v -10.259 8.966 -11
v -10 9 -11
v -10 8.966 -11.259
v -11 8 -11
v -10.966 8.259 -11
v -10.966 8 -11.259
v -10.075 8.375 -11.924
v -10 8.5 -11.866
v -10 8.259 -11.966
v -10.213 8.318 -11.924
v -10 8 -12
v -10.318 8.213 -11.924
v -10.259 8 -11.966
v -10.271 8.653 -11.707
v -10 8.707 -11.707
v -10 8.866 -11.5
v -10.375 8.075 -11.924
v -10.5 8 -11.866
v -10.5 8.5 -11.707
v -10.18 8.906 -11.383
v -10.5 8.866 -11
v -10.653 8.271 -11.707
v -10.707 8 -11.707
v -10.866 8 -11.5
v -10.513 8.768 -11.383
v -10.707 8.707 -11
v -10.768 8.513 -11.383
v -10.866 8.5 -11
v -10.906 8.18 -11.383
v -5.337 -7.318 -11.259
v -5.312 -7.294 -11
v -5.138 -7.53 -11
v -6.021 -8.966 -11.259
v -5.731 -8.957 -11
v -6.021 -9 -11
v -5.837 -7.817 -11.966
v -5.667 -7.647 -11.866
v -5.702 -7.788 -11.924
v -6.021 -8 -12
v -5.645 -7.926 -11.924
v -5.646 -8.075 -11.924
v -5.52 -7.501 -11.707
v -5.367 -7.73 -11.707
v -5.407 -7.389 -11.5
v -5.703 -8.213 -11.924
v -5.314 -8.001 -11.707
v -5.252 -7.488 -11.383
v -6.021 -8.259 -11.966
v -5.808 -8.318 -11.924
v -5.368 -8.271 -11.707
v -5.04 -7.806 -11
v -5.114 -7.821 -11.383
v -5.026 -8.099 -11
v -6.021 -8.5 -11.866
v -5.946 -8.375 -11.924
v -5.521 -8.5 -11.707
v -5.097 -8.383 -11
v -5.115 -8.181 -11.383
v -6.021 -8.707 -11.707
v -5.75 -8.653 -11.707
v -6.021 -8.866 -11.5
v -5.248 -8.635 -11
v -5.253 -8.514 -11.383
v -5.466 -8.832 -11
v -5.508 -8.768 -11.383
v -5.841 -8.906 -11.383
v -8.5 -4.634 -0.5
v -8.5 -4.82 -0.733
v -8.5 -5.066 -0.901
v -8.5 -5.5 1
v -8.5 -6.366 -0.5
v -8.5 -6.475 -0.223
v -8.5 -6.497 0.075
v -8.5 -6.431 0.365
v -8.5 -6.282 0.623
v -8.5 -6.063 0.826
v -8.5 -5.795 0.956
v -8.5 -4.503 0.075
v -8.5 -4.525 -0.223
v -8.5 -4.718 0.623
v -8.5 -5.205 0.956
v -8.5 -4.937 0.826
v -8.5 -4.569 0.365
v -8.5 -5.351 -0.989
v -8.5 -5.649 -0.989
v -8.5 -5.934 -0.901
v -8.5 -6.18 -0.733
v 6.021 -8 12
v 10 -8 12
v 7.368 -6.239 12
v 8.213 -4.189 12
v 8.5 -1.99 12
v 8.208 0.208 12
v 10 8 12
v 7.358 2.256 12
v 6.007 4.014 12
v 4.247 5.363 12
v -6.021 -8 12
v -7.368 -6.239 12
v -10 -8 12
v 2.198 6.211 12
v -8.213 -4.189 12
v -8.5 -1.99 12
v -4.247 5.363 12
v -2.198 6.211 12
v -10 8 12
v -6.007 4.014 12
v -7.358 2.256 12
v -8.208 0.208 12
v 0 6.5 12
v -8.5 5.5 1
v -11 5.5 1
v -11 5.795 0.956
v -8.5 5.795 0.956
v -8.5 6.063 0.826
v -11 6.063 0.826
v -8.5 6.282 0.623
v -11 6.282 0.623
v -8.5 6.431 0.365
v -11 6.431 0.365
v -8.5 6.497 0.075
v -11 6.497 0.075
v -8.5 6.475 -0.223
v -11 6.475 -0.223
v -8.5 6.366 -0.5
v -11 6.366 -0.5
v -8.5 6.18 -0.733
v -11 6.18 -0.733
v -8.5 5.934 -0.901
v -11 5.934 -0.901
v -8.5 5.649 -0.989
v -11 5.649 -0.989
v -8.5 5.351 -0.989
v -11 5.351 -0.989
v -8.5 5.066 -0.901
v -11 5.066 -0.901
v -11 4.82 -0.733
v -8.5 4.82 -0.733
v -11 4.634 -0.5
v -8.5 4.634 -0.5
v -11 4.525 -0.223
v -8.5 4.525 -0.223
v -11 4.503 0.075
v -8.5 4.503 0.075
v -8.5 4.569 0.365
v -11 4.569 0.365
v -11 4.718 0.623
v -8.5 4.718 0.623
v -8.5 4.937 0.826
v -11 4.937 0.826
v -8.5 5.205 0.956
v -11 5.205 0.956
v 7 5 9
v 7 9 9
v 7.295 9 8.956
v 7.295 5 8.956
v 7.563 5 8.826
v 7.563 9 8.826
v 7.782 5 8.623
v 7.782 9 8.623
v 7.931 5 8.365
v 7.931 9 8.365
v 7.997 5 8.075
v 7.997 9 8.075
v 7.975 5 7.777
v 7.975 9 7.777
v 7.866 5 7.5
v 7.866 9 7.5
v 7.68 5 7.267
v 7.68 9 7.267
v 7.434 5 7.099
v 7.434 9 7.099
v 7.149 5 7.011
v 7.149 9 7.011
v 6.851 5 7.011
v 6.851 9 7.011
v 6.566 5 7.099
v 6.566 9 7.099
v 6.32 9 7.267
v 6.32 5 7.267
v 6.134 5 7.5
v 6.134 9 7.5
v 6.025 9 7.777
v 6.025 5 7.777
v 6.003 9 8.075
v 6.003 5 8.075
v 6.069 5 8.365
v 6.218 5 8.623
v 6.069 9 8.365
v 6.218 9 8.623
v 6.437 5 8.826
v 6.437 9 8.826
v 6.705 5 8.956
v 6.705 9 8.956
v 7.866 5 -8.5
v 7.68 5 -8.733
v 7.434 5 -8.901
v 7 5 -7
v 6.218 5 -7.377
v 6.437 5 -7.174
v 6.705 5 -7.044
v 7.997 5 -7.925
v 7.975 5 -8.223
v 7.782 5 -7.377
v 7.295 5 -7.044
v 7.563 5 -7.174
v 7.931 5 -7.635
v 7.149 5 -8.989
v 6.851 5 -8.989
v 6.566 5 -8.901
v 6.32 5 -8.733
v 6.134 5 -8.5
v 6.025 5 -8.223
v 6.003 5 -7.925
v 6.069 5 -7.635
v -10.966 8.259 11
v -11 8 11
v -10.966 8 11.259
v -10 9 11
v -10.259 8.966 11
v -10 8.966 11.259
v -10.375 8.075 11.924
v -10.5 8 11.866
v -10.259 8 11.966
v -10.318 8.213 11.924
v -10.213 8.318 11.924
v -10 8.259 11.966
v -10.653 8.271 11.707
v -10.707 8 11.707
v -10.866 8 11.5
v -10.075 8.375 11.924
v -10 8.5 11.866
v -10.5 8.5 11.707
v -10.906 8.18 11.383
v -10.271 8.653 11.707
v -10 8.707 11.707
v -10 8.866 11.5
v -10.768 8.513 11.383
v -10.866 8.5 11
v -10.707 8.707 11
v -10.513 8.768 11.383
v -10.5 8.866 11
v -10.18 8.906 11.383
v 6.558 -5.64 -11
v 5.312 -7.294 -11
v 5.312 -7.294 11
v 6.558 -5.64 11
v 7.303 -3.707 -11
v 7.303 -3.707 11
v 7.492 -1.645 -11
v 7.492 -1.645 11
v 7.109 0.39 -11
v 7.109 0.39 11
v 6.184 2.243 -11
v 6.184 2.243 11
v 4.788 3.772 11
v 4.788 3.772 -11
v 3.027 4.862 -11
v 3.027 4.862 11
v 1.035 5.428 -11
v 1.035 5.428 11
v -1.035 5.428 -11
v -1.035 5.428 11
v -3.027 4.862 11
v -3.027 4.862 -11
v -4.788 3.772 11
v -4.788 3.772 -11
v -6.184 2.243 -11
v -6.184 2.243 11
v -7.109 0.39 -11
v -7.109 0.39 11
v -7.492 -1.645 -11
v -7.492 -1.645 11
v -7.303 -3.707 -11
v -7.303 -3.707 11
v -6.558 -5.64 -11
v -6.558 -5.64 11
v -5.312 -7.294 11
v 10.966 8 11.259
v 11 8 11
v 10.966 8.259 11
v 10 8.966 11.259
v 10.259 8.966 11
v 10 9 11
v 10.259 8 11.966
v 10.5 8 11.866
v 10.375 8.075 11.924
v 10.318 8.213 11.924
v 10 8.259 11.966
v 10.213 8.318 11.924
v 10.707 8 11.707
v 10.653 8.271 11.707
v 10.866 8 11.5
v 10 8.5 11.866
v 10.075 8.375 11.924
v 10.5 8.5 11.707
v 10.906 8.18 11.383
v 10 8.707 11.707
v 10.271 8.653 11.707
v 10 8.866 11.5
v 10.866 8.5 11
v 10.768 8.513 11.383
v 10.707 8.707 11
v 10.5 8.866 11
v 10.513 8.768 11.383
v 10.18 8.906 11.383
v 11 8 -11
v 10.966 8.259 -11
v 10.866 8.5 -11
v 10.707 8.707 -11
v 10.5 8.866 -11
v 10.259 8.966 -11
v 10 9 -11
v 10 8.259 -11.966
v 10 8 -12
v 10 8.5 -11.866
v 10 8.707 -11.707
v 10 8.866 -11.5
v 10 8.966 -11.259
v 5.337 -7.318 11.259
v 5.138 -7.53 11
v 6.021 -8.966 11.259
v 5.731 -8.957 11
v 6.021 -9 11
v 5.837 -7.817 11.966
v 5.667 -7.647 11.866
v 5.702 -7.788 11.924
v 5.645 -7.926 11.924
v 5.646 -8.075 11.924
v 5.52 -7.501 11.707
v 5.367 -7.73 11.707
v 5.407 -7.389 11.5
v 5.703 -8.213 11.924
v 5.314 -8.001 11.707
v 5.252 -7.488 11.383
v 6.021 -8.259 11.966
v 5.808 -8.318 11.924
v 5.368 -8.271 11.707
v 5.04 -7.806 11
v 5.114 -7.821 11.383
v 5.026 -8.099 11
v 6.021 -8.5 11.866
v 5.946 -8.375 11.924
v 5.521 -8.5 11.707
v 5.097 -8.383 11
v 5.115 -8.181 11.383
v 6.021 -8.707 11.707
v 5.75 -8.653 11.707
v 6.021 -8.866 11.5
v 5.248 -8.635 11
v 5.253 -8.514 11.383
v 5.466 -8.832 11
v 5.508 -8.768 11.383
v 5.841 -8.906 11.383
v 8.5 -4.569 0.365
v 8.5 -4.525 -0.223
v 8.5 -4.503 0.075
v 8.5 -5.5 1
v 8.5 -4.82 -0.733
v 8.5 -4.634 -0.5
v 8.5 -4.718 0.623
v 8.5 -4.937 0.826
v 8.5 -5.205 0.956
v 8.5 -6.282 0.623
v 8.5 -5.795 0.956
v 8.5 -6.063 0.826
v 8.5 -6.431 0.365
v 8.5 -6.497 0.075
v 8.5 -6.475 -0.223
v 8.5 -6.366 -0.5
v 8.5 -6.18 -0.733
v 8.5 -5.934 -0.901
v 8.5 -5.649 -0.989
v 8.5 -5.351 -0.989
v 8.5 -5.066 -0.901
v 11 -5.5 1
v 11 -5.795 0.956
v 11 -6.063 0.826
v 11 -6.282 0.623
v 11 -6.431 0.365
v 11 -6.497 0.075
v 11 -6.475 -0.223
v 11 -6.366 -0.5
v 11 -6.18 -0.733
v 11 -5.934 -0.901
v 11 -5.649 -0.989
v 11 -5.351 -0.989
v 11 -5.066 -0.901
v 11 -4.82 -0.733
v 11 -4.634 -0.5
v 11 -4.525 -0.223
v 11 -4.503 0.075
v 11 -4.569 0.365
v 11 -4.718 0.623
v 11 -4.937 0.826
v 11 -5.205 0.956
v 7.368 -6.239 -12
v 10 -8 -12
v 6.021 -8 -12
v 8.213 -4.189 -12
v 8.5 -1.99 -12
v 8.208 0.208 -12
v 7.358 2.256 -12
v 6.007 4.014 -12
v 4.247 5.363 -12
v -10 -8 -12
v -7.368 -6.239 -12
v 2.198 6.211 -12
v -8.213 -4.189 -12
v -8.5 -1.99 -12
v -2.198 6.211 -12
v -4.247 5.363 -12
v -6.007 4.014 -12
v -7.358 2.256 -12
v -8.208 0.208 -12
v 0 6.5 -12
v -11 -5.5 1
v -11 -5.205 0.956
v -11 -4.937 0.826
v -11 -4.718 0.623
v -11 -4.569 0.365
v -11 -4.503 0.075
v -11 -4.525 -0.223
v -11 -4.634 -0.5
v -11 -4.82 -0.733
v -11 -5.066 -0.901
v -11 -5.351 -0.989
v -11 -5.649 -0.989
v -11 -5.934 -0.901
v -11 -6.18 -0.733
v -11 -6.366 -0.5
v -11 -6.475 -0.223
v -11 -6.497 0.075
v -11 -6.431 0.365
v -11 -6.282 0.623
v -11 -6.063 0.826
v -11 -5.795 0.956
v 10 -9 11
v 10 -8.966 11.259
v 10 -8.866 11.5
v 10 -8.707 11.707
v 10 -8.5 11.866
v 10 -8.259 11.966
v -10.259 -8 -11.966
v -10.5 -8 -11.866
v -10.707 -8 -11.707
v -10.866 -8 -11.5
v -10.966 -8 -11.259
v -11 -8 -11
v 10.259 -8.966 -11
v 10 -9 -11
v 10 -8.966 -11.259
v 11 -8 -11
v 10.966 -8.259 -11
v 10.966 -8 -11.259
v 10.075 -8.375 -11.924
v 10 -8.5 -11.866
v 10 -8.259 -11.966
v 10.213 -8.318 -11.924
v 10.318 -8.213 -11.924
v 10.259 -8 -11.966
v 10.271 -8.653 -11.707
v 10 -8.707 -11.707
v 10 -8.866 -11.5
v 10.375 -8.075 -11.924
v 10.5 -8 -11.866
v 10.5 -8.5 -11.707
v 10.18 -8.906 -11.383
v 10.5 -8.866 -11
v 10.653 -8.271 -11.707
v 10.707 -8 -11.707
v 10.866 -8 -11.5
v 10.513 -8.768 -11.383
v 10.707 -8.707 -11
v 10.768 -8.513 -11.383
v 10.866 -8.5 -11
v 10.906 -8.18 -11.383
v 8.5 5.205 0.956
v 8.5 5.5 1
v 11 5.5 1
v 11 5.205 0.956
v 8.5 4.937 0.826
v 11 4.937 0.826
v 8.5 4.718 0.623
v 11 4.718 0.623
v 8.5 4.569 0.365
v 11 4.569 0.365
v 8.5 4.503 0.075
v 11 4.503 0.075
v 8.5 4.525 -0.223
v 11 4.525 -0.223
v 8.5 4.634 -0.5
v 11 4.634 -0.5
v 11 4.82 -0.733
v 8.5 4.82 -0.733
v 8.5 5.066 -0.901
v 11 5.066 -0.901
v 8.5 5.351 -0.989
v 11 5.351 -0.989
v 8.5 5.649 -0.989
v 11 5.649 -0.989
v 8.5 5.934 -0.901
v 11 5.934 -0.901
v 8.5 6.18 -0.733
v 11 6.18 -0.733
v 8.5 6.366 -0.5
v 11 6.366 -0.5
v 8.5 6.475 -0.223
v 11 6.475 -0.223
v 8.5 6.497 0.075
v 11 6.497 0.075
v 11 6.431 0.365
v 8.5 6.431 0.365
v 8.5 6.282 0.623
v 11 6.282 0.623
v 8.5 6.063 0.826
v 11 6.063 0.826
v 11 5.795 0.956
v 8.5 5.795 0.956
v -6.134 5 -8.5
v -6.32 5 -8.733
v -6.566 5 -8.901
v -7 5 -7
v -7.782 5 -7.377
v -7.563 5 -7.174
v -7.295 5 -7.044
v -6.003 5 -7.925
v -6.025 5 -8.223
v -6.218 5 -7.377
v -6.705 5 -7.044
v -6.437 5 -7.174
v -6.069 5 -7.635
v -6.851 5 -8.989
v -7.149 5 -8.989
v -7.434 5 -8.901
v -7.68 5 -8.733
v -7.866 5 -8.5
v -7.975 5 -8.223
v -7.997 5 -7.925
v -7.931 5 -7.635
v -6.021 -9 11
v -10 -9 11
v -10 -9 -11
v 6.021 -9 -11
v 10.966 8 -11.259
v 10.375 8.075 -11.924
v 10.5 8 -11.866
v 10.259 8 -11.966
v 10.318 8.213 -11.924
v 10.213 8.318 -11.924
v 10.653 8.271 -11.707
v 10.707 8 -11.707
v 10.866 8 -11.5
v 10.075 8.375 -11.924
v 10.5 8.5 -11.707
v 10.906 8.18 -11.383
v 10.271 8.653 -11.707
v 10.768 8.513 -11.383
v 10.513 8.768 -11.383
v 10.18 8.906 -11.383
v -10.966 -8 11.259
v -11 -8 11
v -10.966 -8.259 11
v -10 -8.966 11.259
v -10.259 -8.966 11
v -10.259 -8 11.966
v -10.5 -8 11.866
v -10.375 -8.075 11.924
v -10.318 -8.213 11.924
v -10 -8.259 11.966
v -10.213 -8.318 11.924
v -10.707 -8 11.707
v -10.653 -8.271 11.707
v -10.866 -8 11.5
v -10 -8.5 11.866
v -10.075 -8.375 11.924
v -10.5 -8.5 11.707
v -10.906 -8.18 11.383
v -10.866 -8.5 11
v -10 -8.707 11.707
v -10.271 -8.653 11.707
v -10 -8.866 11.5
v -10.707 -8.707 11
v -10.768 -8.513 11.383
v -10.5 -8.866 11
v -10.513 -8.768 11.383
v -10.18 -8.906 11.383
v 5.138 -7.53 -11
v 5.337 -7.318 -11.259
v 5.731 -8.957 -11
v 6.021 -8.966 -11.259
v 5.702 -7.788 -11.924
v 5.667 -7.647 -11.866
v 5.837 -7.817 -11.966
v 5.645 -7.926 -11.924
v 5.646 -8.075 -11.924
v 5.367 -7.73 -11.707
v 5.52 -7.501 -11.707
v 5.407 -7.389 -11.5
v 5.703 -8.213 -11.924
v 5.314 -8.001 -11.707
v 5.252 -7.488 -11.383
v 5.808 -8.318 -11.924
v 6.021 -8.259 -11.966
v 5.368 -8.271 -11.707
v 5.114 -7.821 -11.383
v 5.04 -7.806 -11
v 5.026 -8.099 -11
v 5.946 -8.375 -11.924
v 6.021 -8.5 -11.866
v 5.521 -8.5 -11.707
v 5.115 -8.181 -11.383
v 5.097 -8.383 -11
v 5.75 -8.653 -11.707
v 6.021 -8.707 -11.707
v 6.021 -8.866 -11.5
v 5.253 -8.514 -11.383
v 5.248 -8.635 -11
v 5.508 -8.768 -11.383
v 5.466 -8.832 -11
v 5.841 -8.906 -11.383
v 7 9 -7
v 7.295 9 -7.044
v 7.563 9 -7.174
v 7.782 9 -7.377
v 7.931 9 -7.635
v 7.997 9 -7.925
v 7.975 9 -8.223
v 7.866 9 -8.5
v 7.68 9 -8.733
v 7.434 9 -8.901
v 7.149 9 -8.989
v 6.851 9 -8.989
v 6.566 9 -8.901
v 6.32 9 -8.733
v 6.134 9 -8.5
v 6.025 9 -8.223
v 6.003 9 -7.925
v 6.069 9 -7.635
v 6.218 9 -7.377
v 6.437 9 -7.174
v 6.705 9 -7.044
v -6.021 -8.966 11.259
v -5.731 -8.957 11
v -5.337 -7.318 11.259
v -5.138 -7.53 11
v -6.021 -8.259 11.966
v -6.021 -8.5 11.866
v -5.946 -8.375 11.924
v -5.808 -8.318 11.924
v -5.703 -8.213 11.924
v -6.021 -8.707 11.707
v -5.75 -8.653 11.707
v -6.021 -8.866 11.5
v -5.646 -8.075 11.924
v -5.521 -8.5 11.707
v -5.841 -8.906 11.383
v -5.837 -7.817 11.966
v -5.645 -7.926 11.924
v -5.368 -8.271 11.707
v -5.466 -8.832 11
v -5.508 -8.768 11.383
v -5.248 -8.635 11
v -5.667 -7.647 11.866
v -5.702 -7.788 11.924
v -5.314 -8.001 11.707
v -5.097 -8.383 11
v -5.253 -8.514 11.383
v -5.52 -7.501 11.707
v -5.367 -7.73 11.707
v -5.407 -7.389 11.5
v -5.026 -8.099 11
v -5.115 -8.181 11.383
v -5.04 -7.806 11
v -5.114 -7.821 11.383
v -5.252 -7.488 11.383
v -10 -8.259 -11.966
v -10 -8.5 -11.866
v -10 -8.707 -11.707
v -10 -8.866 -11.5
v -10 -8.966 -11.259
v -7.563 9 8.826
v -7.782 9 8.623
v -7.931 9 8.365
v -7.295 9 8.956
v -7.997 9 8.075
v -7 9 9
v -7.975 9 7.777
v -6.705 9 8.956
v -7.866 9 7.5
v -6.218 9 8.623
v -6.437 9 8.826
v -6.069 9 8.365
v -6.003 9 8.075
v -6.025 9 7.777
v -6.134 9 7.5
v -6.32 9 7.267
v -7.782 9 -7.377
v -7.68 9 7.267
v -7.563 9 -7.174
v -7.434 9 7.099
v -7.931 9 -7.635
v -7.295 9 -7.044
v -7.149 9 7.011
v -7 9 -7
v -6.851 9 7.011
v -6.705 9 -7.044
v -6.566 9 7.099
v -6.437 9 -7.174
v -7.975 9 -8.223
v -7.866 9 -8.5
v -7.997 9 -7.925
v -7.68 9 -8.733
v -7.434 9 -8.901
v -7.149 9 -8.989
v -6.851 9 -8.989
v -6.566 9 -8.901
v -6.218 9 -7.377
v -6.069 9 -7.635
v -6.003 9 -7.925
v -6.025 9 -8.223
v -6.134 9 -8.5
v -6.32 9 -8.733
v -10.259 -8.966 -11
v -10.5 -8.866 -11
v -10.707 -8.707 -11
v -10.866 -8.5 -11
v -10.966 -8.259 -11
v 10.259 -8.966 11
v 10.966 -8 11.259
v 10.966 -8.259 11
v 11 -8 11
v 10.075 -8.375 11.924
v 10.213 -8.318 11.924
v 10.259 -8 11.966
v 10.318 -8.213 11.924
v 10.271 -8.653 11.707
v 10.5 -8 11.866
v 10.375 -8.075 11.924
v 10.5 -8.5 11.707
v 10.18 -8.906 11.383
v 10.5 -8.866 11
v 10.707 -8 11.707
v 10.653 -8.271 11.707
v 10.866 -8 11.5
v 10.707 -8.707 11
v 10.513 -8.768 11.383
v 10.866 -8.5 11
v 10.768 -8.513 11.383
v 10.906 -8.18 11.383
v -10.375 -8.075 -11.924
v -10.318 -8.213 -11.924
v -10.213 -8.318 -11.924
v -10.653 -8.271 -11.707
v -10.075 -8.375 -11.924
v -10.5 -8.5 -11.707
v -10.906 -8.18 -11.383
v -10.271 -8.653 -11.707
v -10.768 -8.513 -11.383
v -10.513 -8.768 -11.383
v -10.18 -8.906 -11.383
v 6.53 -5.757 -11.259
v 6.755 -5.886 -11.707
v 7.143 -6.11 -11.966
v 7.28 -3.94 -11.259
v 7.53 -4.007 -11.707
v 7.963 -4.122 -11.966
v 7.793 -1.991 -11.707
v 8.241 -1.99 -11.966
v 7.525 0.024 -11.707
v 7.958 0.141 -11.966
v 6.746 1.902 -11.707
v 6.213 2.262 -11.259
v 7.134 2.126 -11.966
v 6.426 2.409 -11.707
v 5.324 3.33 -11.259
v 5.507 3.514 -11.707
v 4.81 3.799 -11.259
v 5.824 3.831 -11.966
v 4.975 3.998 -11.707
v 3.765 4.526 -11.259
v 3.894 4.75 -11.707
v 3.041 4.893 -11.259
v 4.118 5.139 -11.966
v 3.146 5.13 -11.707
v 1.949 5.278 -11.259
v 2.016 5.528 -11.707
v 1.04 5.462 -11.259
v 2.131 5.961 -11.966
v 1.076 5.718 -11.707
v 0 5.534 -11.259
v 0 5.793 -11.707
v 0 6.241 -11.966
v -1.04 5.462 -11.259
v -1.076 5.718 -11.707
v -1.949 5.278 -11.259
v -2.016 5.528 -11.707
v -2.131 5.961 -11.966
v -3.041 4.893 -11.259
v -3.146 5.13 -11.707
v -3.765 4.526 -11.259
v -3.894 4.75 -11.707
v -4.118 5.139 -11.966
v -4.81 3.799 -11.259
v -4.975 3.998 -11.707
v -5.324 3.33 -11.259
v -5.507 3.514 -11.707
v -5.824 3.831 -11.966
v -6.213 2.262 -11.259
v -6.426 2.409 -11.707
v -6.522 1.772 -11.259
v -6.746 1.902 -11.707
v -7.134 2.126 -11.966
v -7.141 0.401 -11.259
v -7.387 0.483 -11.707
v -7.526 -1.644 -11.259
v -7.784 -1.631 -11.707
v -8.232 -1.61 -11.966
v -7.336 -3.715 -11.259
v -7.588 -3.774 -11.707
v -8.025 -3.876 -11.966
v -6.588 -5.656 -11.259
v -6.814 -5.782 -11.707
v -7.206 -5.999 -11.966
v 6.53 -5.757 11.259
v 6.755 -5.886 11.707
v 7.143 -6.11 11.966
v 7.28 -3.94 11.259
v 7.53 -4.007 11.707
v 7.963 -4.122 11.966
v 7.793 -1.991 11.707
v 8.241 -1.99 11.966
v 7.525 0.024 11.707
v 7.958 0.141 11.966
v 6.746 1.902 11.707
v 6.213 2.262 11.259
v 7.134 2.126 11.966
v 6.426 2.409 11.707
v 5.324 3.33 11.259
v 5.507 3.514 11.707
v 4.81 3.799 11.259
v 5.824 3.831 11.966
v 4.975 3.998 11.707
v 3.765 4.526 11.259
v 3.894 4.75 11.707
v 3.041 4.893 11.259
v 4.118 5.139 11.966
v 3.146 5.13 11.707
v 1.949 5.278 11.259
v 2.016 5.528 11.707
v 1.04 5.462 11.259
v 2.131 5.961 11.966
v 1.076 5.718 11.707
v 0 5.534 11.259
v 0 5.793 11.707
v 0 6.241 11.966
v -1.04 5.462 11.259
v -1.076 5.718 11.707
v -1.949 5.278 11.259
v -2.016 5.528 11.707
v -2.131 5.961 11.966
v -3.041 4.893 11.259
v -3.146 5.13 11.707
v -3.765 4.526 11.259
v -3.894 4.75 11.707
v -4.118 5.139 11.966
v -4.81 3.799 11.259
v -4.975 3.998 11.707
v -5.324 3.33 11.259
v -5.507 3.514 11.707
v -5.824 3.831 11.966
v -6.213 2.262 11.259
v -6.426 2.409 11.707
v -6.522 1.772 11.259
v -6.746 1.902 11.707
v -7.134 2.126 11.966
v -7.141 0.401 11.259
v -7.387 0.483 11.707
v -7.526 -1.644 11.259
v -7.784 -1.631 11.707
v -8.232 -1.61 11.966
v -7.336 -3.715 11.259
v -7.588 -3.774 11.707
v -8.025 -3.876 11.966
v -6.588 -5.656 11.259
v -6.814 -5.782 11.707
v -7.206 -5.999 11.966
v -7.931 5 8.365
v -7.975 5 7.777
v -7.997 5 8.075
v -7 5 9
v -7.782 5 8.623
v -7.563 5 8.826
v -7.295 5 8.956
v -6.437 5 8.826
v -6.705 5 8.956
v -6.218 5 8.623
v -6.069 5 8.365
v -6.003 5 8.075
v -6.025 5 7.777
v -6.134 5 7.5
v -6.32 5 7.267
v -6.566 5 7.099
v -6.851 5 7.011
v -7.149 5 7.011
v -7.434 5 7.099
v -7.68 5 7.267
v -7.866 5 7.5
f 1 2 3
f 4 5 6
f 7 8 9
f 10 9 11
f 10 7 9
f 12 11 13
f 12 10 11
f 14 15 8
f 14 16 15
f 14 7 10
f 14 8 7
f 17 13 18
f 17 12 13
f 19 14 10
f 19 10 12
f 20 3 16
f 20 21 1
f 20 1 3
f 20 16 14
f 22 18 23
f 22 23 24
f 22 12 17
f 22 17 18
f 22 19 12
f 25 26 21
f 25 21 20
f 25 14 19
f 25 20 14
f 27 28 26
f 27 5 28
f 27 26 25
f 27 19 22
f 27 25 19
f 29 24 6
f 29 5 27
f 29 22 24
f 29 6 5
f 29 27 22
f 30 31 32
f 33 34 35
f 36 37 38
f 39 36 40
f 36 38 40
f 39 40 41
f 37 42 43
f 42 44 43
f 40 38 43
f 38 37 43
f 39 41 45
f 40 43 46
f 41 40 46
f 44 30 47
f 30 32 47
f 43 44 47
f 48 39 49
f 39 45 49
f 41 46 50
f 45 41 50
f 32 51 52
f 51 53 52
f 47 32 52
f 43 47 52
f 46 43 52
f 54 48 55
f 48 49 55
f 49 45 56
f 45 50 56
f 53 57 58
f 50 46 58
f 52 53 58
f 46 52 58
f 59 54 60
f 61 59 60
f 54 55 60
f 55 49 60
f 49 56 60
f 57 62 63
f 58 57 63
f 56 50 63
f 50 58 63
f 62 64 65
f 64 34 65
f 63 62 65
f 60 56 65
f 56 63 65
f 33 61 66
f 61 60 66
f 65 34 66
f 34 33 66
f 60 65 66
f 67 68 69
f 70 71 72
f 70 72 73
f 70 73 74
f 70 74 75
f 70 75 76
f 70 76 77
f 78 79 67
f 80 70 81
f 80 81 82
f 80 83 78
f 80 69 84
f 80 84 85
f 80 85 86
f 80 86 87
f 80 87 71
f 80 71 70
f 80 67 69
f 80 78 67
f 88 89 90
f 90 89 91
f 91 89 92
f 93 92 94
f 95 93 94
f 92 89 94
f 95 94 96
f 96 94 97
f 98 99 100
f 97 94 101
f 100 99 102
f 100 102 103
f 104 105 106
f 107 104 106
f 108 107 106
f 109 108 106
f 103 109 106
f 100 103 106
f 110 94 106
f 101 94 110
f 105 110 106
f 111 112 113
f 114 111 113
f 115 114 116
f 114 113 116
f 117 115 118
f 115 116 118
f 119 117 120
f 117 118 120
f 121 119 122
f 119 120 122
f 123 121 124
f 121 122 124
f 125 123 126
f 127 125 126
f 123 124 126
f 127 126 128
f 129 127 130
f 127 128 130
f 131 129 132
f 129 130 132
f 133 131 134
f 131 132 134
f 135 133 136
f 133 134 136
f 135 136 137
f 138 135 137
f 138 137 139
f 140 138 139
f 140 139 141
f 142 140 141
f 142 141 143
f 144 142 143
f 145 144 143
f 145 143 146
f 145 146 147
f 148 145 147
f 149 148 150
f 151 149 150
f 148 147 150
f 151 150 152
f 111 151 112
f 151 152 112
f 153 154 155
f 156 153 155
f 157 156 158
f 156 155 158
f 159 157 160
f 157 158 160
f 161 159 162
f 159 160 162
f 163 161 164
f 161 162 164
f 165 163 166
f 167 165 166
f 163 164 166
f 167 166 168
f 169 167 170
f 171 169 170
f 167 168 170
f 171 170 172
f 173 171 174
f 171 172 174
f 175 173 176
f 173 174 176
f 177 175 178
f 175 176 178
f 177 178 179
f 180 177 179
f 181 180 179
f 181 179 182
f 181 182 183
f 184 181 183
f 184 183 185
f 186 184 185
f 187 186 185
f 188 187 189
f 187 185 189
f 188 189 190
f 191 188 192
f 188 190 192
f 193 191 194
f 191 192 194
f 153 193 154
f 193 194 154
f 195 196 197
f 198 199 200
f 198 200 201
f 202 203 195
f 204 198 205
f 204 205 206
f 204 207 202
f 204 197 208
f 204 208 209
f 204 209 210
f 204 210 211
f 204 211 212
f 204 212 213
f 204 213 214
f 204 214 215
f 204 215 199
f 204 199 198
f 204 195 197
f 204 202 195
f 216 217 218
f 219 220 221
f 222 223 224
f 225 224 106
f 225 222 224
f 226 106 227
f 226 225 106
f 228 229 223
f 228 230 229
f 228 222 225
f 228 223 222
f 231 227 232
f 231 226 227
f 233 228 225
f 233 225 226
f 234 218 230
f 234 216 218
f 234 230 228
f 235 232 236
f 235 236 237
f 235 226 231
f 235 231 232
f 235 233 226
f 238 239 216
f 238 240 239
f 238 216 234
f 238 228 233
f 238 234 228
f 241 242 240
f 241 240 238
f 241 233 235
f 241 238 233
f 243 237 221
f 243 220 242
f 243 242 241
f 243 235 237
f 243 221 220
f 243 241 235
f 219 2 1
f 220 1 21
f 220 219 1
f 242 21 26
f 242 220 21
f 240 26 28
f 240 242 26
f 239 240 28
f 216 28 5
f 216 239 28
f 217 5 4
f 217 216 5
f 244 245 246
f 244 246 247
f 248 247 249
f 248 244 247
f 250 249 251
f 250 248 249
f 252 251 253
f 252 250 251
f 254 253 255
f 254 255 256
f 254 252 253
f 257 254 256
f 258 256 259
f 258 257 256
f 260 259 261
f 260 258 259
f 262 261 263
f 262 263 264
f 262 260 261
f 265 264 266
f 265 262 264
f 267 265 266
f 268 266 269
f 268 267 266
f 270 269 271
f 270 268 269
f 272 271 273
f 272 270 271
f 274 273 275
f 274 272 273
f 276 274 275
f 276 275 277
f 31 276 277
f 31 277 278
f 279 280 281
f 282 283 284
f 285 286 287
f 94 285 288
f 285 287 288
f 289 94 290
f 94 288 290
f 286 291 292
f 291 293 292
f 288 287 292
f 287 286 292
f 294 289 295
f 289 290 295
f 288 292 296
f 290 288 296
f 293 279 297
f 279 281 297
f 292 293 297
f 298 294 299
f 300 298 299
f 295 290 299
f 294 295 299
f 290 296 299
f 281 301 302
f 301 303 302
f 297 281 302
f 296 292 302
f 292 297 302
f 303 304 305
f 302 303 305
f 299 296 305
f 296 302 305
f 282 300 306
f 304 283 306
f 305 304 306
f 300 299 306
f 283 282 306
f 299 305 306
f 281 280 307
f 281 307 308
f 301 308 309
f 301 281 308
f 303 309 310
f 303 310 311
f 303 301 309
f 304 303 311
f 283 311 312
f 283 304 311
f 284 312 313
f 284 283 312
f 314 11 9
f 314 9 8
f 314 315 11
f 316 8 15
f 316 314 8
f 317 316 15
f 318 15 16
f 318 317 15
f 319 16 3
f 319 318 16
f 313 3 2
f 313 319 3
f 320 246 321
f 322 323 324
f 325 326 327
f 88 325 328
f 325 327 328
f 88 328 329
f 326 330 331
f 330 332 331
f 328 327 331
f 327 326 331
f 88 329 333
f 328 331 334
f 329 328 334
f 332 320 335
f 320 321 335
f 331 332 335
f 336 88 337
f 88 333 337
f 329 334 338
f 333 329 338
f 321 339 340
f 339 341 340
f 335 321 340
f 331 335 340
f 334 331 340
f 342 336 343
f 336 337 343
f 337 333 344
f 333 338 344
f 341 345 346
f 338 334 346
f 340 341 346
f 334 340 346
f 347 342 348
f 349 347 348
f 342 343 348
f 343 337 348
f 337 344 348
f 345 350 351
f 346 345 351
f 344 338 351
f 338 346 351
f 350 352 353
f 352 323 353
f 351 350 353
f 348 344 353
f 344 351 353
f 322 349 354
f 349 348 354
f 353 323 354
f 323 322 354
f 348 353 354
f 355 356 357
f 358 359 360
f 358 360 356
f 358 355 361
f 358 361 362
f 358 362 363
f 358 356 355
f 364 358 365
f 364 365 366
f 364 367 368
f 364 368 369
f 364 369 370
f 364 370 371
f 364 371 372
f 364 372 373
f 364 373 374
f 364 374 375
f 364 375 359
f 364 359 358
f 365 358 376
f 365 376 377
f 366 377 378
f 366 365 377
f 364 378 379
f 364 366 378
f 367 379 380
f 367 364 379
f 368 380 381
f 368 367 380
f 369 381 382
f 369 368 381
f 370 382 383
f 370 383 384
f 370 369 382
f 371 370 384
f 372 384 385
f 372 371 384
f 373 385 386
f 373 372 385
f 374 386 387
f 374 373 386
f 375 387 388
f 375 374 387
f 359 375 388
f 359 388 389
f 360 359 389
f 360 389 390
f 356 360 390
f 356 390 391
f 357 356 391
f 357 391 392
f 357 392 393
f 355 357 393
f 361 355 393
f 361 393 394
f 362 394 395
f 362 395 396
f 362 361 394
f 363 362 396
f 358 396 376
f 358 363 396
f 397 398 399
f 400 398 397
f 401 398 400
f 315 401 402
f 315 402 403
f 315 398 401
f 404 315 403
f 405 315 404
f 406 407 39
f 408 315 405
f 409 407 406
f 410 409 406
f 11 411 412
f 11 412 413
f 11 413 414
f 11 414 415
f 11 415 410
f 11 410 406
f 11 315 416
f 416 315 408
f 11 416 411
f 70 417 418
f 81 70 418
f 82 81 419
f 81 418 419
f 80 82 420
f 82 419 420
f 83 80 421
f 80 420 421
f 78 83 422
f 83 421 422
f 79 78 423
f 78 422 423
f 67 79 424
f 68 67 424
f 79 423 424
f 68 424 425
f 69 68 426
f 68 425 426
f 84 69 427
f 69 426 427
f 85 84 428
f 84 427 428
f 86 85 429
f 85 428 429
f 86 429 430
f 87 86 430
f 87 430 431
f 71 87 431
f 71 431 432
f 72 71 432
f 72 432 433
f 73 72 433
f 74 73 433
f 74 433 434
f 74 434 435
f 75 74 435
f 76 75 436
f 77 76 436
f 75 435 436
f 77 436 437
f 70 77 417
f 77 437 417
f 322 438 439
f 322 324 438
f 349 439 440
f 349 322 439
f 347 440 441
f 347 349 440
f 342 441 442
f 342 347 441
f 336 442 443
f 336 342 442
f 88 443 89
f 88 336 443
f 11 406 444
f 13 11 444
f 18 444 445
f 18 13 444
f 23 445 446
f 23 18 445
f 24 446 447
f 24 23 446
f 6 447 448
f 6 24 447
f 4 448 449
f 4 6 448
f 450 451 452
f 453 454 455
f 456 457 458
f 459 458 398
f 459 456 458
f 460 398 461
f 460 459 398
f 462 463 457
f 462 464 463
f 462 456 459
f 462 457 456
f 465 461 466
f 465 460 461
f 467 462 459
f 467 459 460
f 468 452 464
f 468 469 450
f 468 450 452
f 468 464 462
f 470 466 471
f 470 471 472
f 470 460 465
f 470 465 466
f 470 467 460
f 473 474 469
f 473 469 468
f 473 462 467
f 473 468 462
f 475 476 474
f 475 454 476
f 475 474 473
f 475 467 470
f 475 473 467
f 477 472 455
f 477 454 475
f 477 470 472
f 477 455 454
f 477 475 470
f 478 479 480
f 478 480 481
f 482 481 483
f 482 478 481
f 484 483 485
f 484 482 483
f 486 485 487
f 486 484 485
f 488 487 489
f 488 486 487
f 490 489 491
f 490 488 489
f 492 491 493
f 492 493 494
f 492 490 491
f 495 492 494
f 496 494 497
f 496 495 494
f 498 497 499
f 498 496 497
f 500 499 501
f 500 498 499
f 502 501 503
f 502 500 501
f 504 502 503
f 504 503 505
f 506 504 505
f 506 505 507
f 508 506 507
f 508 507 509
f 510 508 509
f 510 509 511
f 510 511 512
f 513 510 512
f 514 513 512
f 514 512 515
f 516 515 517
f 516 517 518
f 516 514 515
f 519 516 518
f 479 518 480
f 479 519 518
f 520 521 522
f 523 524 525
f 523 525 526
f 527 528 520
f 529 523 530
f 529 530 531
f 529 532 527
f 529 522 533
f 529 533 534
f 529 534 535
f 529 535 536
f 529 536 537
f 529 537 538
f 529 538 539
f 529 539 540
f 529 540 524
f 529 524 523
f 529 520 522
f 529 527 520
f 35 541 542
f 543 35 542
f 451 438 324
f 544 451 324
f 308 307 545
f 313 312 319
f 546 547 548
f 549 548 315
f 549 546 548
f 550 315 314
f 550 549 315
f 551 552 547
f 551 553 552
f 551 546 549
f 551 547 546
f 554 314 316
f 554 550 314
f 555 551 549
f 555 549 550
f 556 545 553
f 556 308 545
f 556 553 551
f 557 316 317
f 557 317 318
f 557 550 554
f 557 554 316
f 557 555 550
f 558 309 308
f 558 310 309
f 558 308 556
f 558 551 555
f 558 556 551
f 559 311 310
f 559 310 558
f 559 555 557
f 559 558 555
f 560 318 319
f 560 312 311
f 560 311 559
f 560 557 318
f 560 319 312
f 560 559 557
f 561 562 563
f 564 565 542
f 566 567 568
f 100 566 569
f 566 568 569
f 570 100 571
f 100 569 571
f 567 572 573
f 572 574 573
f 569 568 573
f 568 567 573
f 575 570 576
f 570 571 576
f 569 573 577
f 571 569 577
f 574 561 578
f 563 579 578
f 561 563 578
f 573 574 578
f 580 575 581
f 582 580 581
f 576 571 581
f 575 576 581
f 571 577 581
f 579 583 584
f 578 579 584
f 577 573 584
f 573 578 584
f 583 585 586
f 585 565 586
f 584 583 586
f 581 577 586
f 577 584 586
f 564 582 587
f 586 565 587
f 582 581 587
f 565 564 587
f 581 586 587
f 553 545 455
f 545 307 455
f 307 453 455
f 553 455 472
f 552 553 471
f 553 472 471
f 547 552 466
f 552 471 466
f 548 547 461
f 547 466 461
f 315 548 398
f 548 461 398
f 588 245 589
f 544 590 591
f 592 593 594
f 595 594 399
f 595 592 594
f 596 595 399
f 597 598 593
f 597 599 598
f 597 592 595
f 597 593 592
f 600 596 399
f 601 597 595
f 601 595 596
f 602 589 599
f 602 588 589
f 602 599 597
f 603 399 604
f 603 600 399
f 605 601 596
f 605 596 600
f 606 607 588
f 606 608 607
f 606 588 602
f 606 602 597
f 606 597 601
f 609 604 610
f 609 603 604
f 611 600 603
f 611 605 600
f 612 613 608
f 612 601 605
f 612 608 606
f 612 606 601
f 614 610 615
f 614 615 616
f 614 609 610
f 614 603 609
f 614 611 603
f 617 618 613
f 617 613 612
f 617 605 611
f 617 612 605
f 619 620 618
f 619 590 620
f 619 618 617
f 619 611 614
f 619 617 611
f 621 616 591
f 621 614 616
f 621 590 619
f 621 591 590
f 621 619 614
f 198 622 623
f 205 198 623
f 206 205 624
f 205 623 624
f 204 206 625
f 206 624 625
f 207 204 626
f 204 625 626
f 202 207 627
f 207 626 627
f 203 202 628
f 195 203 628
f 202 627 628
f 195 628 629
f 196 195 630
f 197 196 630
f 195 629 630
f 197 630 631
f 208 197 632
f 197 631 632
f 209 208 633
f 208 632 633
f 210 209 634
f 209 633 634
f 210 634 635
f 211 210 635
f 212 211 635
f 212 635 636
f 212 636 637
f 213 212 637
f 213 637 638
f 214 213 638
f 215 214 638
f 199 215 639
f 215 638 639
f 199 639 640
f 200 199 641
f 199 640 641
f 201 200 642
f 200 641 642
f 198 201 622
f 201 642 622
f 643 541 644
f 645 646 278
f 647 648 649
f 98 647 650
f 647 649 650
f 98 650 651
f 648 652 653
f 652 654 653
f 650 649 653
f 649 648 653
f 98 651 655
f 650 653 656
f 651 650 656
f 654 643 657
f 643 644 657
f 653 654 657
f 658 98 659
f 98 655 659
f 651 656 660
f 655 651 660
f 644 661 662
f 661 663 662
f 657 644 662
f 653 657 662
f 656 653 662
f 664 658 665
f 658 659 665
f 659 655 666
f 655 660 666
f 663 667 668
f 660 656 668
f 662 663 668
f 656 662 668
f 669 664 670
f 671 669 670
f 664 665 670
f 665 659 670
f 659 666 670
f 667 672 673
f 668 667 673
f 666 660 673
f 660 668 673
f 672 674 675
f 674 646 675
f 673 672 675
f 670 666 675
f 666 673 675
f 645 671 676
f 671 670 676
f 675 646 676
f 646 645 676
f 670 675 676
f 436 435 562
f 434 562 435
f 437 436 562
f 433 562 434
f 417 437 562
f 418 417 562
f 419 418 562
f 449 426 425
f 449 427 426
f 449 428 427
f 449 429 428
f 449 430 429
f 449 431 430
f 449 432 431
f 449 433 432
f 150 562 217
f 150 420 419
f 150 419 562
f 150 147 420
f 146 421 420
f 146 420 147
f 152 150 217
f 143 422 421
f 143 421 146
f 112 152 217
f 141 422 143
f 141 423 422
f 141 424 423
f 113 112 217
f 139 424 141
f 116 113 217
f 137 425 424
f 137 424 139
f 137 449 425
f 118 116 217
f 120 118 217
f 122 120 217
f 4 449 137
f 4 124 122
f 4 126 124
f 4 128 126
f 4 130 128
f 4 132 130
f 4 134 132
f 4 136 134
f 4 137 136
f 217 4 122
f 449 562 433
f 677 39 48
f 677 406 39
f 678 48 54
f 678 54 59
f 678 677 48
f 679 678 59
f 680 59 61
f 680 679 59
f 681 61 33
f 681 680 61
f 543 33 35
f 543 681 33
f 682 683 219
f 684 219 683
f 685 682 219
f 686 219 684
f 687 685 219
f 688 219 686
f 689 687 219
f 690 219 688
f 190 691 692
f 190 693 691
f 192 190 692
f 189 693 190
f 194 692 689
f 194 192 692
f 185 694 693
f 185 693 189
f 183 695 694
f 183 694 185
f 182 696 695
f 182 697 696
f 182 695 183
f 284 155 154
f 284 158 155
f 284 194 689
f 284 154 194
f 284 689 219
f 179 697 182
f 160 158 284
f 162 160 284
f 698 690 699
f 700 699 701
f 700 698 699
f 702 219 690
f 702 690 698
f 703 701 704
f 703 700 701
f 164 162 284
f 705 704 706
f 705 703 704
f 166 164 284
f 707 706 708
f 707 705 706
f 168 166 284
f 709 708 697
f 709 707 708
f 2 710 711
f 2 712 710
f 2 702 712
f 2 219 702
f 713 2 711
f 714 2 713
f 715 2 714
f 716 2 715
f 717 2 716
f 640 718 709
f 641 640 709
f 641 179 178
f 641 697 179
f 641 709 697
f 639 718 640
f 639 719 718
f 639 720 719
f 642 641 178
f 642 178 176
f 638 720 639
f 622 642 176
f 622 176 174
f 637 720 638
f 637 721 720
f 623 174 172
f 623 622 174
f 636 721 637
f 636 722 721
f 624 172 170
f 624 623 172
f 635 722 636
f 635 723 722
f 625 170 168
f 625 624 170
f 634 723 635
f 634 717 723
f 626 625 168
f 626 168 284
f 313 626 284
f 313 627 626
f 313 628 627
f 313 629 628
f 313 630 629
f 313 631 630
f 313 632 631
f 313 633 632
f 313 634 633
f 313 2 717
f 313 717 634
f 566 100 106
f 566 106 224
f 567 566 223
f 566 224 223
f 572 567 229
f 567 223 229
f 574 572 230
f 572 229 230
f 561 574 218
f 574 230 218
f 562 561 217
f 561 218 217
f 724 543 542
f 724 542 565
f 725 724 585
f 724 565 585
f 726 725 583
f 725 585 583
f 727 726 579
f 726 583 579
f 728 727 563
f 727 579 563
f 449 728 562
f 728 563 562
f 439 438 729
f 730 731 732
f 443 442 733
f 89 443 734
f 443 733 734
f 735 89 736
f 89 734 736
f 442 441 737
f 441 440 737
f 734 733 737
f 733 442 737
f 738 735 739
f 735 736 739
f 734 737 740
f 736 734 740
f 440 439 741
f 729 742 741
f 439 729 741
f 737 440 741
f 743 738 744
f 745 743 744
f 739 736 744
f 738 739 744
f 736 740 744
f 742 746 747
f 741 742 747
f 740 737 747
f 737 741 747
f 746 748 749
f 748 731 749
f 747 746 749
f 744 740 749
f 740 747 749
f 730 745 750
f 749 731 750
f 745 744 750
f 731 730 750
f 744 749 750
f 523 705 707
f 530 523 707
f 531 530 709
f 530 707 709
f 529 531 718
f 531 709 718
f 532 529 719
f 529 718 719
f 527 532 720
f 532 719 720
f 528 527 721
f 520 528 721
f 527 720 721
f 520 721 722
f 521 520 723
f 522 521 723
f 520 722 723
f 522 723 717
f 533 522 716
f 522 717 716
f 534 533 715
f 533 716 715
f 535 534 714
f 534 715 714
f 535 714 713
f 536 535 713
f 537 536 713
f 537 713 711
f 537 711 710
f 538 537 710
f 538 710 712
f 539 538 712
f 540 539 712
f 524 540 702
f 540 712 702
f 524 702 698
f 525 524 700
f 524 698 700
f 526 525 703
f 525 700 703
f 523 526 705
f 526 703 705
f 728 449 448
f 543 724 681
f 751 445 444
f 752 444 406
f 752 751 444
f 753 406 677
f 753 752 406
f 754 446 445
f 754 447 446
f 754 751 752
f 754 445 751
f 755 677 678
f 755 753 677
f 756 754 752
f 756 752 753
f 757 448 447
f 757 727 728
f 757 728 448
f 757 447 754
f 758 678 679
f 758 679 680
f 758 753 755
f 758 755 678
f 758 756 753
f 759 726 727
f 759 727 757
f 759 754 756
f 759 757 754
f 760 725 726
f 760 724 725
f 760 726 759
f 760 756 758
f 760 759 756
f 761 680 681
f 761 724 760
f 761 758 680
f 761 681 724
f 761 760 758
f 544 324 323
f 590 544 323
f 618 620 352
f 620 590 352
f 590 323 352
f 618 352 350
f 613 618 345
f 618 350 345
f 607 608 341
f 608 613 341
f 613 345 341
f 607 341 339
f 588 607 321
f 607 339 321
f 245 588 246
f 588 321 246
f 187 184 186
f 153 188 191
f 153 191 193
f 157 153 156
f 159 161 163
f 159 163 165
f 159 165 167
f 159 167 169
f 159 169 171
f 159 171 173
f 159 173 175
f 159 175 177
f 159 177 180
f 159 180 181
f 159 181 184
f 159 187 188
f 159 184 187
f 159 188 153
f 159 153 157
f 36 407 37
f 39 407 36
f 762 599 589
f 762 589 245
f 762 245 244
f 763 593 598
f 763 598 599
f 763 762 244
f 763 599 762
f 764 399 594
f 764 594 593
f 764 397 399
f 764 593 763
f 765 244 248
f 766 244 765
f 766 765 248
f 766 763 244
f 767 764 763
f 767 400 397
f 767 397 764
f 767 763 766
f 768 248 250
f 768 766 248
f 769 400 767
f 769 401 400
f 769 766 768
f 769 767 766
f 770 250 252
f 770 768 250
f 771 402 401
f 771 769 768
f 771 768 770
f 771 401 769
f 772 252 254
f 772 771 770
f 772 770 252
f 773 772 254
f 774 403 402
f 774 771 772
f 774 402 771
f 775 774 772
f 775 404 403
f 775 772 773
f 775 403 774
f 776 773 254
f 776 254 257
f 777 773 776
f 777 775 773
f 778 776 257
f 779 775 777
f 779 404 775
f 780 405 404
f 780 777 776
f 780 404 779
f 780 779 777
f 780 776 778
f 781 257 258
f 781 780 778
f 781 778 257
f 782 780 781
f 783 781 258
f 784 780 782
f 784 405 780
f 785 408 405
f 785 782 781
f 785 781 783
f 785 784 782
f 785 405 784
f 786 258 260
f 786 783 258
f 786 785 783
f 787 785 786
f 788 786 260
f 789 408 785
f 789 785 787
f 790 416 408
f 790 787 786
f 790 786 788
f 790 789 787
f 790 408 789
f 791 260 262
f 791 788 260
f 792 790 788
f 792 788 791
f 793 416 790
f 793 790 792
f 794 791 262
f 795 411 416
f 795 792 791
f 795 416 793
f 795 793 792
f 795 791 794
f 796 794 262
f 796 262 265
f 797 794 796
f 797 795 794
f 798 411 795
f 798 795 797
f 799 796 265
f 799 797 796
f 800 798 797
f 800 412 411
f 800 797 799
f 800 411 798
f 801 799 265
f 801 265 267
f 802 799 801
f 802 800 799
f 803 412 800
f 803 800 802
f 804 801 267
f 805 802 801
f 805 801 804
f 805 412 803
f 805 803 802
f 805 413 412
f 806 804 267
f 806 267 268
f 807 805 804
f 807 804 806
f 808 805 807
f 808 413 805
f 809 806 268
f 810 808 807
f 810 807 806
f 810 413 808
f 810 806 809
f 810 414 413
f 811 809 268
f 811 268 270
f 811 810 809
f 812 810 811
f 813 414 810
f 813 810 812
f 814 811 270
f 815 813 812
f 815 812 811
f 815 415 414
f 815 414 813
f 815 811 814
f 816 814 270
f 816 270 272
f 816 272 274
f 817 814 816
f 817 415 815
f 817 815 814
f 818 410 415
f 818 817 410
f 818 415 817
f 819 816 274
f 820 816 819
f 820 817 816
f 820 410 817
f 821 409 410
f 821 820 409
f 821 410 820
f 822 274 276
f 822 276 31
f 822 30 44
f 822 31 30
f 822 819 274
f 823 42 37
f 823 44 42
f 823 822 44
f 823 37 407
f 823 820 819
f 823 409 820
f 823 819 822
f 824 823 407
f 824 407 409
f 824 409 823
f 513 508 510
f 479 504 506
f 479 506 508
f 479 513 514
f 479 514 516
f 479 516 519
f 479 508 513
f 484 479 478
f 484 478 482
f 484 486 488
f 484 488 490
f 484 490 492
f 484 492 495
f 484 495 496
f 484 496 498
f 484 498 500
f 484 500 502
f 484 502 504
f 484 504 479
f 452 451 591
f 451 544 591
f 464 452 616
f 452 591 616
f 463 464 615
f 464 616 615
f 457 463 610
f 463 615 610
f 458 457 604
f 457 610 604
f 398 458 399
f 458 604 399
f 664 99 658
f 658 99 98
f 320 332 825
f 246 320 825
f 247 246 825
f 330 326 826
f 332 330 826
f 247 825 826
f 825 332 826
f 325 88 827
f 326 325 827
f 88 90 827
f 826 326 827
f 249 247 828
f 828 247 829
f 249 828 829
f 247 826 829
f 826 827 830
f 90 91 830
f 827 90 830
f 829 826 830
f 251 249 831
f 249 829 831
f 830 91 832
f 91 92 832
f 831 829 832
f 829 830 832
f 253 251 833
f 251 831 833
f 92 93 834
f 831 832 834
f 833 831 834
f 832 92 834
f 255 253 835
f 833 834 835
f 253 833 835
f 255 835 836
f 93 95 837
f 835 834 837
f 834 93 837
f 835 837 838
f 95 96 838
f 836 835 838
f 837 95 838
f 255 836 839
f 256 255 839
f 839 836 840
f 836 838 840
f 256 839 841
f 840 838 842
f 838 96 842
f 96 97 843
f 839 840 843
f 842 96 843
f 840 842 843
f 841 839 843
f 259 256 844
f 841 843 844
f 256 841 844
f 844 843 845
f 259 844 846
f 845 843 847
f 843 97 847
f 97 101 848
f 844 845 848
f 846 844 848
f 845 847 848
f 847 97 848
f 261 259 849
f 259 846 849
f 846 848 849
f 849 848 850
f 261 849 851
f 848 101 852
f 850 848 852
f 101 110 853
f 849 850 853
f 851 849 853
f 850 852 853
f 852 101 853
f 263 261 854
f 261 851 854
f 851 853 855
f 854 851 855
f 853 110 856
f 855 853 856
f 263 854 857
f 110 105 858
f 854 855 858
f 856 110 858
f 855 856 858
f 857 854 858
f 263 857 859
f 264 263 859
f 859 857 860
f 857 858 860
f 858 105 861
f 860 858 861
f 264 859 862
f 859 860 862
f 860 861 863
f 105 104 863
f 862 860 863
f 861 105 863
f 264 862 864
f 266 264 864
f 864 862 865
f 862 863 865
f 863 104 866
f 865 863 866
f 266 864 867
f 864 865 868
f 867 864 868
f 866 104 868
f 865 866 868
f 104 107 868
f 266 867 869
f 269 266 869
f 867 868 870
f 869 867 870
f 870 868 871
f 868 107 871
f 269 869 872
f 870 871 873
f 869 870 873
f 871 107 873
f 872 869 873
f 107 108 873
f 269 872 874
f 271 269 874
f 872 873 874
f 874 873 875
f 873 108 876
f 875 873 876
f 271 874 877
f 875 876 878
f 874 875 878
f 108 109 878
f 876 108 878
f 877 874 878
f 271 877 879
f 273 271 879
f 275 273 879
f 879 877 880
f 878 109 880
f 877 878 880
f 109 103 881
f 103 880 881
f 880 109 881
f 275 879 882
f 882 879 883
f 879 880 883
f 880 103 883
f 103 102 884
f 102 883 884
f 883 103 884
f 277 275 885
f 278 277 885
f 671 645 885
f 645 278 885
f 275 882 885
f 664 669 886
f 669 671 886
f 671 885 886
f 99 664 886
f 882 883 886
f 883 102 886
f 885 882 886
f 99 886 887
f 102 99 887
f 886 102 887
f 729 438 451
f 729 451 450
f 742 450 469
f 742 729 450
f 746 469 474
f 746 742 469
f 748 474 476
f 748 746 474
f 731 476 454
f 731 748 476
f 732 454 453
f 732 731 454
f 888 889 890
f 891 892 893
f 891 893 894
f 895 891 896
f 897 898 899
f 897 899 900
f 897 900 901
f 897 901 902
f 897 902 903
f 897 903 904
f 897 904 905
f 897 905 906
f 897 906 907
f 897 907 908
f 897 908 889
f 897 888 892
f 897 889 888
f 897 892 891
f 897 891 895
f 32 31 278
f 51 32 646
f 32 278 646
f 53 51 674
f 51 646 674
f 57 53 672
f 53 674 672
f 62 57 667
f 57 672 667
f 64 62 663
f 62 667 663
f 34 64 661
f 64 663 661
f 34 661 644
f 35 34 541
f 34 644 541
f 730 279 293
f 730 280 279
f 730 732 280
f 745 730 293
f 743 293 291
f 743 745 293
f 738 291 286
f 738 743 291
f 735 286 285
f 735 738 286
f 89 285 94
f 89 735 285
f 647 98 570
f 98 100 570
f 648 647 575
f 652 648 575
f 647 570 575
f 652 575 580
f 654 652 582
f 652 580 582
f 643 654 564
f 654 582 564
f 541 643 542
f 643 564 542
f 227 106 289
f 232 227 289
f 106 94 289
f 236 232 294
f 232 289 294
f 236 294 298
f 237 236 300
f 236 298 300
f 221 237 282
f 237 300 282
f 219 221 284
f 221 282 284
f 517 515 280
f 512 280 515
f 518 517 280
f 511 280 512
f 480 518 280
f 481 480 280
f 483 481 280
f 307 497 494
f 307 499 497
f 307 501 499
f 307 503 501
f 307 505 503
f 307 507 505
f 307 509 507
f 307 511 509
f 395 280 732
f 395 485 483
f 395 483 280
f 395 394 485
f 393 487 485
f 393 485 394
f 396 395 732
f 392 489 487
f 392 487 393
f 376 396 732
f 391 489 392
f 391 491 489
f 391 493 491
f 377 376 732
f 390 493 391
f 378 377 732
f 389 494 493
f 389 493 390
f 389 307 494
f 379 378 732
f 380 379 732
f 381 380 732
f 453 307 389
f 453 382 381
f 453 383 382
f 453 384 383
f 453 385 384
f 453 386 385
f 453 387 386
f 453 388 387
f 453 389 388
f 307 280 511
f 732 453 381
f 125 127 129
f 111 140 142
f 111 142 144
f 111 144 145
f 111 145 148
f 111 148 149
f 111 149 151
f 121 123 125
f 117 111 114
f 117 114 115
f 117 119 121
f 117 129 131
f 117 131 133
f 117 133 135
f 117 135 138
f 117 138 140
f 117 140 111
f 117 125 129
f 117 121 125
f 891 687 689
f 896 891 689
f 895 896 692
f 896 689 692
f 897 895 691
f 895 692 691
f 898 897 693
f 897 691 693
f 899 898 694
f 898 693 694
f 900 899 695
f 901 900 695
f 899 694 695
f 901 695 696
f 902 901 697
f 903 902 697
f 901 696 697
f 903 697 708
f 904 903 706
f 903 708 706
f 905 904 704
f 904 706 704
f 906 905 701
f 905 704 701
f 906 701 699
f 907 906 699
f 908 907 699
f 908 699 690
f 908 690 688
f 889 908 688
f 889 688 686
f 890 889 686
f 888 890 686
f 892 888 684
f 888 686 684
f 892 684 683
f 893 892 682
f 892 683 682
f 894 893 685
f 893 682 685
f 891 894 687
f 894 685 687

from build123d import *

# Parameters (mm, degrees)
BOSS_EXTRU_1_DEPTH      = 12
BOSS_EXTRU_1_DEPTH_BACK = 12
ENL_V_START             = 9
ESQUISSE2_R             = 1
ENL_V_MAT_EXTRU_1_DEPTH = 4
CONG_1_R                = 1
ESQUISSE3_R             = 1
ENL_V_MAT_EXTRU_2_DEPTH = 2.5
ENL_V_START_2           = -2.5
ESQUISSE6_R             = 1
ENL_V_MAT_EXTRU_4_DEPTH = 2.5


with BuildPart() as part:
    # Esquisse1 → Boss.-Extru.1 (new, two sides: drawn at the far end of the back side and taken through both)
    with BuildSketch(Plane.XY.offset(-BOSS_EXTRU_1_DEPTH_BACK)):
        with BuildLine():
            Line((11, -9), (2.692582404, -9))
            ThreePointArc((2.692582404, -9), (0, 5.5), (-2.692582404, -9))
            Line((-2.692582404, -9), (-11, -9))
            Line((-11, -9), (-11, 9))
            Line((-11, 9), (11, 9))
            Line((11, 9), (11, -9))
        make_face()
    extrude(amount=BOSS_EXTRU_1_DEPTH + BOSS_EXTRU_1_DEPTH_BACK)

    # Esquisse2 → Enlèv. mat.-Extru.1 (cut)
    with BuildSketch(Plane(origin=(0, 0, 0), x_dir=(1, 0, 0), z_dir=(0, 1, 0)).offset(ENL_V_START)):
        with Locations(Location((-7, 8, 0), (0, 0, 270))):
            Circle(ESQUISSE2_R)
        with Locations(Location((7, 8, 0), (0, 0, 270))):
            Circle(ESQUISSE2_R)
        with Locations(Location((7, -8, 0), (0, 0, 270))):
            Circle(ESQUISSE2_R)
        with Locations(Location((-7, -8, 0), (0, 0, 270))):
            Circle(ESQUISSE2_R)
    extrude(amount=-ENL_V_MAT_EXTRU_1_DEPTH, mode=Mode.SUBTRACT)

    # Congé1
    cong_1_edges = [part.edges().sort_by_distance(p)[0] for p in [
        (-11, 9, 0),
        (11, 9, 0),
        (11, -9, 0),
        (2.692582404, -9, 0),
        (-2.692582404, -9, 0),
        (-11, -9, 0),
        (0, 5.5, -12),
        (6.846291202, -9, -12),
        (-11, 0, 12),
        (-6.846291202, -9, 12),
        (0, 5.5, 12),
        (6.846291202, -9, 12),
        (11, 0, 12),
        (0, 9, 12),
        (11, 0, -12),
        (0, 9, -12),
        (-11, 0, -12),
        (-6.846291202, -9, -12),
    ]]
    fillet(cong_1_edges, radius=CONG_1_R)

    # Esquisse3 → Enlèv. mat.-Extru.2 (cut)
    with BuildSketch(Plane.ZY.offset(11)):
        with Locations((0, 5.5)):
            Circle(ESQUISSE3_R)
        with Locations((0, -5.5)):
            Circle(ESQUISSE3_R)
    extrude(amount=-ENL_V_MAT_EXTRU_2_DEPTH, mode=Mode.SUBTRACT)

    # Esquisse6 → Enlèv. mat.-Extru.4 (cut)
    with BuildSketch(Plane(origin=(11, 0, 0), x_dir=(0, 0, -1), z_dir=(1, 0, 0)).offset(ENL_V_START_2)):
        with Locations(Location((0, 5.5, 0), (0, 0, 180))):
            Circle(ESQUISSE6_R)
        with Locations(Location((0, -5.5, 0), (0, 0, 180))):
            Circle(ESQUISSE6_R)
    extrude(amount=ENL_V_MAT_EXTRU_4_DEPTH, mode=Mode.SUBTRACT)


solid = part.part
